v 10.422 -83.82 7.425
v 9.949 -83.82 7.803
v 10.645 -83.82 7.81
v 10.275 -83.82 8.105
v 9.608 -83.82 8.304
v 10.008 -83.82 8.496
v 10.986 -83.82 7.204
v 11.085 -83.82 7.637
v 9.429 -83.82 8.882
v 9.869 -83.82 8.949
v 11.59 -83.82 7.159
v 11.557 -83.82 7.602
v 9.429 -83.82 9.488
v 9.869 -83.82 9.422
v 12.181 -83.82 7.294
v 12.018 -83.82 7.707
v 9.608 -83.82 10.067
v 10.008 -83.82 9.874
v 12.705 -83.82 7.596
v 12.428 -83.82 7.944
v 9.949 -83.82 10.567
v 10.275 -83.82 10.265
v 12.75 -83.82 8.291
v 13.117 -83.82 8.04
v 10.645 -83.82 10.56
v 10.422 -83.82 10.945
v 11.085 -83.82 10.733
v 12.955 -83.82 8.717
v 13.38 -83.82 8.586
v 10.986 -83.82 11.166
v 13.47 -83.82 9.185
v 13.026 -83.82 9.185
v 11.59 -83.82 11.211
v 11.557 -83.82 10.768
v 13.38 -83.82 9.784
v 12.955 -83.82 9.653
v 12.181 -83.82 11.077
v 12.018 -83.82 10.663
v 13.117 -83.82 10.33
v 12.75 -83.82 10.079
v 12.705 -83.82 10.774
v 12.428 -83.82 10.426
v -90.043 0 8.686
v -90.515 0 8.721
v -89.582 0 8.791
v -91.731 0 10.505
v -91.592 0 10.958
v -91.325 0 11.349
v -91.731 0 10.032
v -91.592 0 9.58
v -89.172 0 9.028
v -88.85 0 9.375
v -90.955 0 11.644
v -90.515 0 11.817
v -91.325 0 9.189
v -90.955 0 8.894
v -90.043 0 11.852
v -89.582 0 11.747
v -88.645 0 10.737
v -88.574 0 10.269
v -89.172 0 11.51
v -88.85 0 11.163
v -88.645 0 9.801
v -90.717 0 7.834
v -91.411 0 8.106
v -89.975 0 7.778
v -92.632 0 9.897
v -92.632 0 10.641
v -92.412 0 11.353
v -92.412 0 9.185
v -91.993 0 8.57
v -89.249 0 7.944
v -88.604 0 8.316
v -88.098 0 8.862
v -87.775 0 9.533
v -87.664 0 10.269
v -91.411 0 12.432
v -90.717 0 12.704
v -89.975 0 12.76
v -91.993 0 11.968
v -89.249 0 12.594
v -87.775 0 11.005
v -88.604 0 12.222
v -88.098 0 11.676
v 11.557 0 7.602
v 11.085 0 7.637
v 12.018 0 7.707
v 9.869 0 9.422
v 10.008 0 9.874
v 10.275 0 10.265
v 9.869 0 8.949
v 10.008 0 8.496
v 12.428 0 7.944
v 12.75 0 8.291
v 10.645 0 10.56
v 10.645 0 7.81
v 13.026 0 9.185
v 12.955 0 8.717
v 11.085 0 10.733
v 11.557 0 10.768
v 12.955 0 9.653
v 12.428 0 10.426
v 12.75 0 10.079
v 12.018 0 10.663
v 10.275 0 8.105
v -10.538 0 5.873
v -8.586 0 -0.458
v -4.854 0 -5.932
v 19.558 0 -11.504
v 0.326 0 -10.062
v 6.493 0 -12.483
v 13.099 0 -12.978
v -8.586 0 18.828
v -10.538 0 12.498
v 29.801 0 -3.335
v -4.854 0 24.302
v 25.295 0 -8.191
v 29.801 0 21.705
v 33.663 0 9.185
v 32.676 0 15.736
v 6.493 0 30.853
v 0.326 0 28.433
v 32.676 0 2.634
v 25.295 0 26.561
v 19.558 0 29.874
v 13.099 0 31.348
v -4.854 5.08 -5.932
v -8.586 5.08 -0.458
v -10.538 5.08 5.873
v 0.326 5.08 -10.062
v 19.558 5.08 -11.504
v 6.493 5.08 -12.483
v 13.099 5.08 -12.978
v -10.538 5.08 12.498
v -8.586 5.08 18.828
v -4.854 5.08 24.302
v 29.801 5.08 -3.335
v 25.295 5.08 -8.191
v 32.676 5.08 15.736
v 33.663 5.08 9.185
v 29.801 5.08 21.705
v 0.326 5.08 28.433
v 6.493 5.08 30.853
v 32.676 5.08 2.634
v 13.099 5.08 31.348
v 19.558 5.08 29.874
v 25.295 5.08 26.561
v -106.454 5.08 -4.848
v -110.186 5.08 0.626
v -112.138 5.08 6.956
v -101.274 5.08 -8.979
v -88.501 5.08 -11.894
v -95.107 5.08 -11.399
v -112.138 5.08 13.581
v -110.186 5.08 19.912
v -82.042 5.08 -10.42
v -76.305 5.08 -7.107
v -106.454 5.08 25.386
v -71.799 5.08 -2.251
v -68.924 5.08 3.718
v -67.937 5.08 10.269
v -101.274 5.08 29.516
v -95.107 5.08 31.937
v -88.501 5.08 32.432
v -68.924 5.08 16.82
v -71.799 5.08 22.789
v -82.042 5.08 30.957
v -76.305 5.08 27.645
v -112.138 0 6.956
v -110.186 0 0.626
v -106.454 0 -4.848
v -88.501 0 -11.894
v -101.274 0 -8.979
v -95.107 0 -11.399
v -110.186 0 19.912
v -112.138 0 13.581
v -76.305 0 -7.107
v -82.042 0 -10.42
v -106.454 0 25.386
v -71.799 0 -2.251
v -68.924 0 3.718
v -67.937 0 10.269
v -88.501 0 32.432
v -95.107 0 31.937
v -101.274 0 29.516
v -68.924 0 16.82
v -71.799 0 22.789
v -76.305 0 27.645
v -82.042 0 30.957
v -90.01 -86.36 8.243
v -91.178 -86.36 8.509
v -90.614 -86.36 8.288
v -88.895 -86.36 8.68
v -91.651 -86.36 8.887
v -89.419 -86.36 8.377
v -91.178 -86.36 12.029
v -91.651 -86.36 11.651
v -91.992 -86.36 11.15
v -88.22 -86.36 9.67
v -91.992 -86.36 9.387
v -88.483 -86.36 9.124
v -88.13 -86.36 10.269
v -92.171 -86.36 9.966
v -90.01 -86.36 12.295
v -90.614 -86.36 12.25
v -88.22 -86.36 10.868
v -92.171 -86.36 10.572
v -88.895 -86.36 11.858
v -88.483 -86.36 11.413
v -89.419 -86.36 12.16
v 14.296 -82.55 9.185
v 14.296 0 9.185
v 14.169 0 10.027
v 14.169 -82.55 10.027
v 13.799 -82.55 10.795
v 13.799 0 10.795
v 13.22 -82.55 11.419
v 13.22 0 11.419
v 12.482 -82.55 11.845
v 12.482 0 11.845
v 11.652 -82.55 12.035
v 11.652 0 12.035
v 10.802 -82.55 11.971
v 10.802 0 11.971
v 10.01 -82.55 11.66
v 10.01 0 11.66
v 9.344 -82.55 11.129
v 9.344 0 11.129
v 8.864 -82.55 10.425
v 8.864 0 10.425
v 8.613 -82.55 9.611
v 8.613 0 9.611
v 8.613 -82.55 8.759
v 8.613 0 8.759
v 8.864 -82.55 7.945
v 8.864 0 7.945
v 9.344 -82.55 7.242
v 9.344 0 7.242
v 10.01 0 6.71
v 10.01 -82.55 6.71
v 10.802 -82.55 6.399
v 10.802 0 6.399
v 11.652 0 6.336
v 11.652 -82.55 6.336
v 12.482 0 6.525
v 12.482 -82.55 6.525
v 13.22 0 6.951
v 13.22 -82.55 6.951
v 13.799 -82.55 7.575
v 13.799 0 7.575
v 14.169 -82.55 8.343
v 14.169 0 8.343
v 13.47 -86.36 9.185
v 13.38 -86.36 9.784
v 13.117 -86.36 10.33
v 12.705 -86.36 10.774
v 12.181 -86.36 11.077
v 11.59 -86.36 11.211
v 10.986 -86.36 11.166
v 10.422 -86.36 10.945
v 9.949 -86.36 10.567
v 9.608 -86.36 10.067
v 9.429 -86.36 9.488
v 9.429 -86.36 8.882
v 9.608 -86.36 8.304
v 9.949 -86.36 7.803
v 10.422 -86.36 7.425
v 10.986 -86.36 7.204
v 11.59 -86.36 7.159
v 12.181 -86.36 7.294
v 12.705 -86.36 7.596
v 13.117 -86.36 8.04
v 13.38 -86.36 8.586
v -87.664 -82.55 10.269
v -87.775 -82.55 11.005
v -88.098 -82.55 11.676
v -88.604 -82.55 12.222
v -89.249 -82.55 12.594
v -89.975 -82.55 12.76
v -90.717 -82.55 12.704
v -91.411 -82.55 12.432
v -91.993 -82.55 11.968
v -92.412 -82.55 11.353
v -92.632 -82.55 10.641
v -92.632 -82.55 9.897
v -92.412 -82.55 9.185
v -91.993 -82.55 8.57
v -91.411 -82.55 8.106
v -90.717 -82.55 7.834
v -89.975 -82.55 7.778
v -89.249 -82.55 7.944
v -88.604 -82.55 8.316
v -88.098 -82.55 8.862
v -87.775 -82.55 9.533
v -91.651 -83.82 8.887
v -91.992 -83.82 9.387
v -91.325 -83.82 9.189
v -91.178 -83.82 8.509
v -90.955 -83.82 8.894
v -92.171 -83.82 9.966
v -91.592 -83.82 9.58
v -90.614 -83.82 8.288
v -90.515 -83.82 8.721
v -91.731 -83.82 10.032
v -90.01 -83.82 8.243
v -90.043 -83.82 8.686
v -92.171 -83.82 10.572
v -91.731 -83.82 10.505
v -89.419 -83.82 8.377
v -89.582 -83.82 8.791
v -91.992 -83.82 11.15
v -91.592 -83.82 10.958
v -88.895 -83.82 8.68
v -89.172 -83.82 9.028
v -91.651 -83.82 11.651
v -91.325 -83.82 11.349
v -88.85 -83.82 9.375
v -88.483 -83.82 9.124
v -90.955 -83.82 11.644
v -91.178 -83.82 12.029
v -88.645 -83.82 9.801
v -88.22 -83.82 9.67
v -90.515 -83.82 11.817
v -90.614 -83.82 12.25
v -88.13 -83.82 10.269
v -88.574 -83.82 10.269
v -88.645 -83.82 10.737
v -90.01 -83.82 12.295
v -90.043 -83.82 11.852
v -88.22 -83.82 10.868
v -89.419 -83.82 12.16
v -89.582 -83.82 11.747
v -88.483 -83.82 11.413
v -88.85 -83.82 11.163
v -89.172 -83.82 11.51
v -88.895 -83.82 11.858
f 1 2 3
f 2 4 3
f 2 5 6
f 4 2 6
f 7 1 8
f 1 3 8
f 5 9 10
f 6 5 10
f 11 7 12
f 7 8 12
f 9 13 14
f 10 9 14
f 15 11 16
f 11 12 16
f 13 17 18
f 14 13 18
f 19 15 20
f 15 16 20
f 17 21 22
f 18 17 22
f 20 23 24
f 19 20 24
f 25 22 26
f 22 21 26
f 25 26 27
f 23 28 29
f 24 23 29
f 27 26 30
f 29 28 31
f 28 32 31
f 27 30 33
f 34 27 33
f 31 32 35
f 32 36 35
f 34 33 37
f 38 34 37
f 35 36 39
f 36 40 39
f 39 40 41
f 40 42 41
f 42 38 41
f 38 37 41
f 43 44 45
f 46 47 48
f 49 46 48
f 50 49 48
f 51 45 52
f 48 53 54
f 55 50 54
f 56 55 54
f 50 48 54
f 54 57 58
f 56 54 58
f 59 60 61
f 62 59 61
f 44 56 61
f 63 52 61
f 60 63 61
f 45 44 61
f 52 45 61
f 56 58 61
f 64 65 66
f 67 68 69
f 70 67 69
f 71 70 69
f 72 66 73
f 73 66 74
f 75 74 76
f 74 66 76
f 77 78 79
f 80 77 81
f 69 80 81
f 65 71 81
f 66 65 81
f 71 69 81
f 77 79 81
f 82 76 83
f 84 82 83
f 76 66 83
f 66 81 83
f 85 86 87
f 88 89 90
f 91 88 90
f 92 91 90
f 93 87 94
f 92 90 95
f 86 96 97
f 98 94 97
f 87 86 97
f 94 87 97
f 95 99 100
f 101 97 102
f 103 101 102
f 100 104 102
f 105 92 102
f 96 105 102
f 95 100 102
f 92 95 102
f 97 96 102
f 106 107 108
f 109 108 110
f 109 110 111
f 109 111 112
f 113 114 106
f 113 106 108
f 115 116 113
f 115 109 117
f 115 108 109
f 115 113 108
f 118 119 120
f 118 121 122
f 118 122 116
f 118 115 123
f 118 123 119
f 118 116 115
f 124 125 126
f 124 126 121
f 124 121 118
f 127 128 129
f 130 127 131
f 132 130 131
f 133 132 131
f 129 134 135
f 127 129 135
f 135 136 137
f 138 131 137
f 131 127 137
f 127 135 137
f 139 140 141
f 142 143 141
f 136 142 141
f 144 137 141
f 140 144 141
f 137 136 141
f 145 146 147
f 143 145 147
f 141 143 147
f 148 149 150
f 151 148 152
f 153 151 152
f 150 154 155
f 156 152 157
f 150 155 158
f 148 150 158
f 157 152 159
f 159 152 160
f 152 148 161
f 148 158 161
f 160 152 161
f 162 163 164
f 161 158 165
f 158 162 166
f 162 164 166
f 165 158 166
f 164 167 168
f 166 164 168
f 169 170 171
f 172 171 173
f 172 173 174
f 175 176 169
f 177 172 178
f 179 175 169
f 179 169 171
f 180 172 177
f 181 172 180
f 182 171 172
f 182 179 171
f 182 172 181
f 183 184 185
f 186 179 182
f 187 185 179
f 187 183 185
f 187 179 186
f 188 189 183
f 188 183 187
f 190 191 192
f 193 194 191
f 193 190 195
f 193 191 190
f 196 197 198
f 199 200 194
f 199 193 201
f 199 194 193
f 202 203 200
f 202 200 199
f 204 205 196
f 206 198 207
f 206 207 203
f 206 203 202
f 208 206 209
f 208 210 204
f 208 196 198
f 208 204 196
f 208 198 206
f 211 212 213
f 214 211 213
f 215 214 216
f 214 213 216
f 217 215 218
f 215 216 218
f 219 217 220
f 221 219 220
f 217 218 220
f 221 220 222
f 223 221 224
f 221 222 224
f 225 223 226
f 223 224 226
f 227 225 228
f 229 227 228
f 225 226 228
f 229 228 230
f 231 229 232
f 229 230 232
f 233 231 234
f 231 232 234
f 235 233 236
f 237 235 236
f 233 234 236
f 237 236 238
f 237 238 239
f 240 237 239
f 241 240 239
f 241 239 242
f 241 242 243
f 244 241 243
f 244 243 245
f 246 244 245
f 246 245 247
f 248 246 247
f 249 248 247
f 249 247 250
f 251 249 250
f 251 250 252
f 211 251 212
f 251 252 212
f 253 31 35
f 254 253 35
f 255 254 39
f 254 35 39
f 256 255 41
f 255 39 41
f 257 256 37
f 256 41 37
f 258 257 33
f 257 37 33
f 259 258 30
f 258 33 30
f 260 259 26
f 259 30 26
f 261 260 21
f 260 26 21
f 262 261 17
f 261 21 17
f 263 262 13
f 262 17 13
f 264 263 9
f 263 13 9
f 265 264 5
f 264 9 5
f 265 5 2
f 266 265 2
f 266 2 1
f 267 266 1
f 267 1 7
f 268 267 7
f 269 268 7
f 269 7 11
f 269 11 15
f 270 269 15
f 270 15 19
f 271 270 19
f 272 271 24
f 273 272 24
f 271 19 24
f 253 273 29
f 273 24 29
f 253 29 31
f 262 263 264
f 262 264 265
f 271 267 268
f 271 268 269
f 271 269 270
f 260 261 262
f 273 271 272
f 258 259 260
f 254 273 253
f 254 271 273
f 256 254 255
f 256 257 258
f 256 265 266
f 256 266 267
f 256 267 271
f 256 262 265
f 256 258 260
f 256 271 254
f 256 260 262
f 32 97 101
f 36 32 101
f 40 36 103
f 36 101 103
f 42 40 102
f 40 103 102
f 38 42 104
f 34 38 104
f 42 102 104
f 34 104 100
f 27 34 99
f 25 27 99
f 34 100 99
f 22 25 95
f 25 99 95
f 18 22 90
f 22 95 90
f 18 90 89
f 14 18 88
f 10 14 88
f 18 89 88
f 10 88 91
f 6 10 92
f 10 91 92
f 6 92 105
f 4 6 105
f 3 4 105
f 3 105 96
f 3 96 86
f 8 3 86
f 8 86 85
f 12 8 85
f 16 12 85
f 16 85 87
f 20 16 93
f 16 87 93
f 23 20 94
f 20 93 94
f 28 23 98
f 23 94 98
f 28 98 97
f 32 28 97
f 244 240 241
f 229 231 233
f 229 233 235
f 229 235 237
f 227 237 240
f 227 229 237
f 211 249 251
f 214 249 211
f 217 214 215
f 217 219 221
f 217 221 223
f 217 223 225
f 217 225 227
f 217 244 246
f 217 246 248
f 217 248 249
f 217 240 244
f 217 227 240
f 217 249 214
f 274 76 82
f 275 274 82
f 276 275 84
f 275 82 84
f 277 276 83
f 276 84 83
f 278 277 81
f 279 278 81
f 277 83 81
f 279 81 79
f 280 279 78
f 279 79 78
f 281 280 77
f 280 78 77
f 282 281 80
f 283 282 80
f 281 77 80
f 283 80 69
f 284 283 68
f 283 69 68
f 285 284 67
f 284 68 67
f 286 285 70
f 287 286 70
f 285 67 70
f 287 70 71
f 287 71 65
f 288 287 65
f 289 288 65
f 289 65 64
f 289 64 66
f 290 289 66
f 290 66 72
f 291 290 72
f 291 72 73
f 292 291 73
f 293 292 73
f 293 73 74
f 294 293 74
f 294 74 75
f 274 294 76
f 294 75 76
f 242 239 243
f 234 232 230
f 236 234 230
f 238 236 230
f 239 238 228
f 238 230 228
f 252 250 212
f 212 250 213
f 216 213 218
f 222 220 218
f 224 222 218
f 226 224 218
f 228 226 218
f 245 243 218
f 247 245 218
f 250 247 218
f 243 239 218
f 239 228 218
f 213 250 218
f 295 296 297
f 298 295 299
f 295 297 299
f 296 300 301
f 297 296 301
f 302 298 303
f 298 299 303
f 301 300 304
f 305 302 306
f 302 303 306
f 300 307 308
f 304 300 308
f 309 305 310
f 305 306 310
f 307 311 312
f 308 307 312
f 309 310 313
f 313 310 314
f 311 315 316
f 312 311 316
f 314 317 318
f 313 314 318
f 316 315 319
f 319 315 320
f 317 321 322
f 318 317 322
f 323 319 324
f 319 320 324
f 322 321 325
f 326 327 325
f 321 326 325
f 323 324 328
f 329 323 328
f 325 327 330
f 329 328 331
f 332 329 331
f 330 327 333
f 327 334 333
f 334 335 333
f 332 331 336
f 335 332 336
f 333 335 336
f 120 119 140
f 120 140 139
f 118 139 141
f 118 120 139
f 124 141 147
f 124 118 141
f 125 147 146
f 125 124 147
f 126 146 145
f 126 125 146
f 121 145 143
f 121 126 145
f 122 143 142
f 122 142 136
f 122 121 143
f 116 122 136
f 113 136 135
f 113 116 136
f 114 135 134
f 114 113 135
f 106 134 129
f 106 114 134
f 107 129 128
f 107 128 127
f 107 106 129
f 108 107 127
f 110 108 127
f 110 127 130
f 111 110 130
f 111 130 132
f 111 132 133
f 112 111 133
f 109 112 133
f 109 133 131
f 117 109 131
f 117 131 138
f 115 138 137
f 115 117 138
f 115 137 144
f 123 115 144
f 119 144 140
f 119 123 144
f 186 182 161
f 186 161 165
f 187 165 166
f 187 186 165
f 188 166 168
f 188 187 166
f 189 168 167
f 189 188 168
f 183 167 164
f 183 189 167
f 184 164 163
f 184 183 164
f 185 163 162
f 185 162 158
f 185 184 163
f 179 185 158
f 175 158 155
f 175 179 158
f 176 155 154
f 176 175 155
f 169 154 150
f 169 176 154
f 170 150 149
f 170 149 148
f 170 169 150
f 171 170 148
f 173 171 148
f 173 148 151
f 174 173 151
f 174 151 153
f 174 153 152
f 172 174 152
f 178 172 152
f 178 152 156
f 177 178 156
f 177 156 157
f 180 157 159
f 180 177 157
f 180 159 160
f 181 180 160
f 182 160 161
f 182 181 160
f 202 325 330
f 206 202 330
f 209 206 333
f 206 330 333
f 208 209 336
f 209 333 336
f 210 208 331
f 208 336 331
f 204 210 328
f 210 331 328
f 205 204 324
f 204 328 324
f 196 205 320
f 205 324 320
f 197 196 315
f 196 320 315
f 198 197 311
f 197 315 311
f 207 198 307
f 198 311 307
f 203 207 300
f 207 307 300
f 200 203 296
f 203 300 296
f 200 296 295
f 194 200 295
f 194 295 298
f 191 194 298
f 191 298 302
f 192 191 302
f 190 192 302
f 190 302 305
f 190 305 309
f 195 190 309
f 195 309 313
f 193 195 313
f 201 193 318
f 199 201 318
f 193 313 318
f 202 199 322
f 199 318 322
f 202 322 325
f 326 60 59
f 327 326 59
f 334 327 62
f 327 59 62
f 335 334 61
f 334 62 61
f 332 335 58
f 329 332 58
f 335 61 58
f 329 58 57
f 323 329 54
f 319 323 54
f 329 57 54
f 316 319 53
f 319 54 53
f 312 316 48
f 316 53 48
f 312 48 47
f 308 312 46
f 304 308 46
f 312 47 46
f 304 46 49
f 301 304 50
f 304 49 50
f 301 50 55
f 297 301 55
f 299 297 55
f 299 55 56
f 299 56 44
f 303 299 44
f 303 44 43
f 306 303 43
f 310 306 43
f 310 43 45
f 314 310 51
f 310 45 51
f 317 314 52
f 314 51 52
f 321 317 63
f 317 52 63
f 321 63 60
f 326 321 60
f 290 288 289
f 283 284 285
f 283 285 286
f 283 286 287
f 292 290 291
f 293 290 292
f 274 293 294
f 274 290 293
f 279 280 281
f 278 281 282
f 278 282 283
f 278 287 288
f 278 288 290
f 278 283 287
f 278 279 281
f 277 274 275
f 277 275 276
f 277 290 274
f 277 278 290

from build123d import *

# Parameters (mm, degrees)
F0_R     = 2.497732
F0_R_2   = 2.8575
F1_DEPTH = 82.55
F2_R     = 22.225
F3_DEPTH = 5.08
F4_R     = 1.5875
F5_DEPTH = 83.82
F6_R     = 2.032
F7_DEPTH = 2.54
F8_R     = 2.032
F9_DEPTH = 2.54


with BuildPart() as f1:
    # F0 (on Front) → F1 (new body)
    with BuildSketch(Plane.XZ):
        with Locations((-90.161685, 10.26882)):
            Circle(F0_R)
        with Locations((11.438315, 9.185153)):
            Circle(F0_R_2)
    extrude(amount=F1_DEPTH)


with BuildPart() as f3:
    # F2 (on Front) → F3 (new body)
    with BuildSketch(Plane.XZ):
        with Locations((11.438315, 9.185153)):
            Circle(F2_R)
        with Locations((-90.161685, 10.26882)):
            Circle(F2_R)
    extrude(amount=-F3_DEPTH)


with BuildPart() as f5:
    # F4 (on Front) → F5 (new body)
    with BuildSketch(Plane.XZ):
        with Locations((-90.161685, 10.26882)):
            Circle(F4_R)
        with Locations((11.438315, 9.185153)):
            Circle(F4_R)
    extrude(amount=F5_DEPTH)

    # F6 (on face) → F7 (join)
    with BuildSketch(Plane.XZ.offset(83.82)):
        with Locations((-90.161685, 10.26882)):
            Circle(F6_R)
    extrude(amount=F7_DEPTH)

    # F8 (on face) → F9 (join)
    with BuildSketch(Plane.XZ.offset(83.82)):
        with Locations((11.438315, 9.185153)):
            Circle(F8_R)
    extrude(amount=F9_DEPTH)


solid = Compound([f1.part, f3.part, f5.part])
